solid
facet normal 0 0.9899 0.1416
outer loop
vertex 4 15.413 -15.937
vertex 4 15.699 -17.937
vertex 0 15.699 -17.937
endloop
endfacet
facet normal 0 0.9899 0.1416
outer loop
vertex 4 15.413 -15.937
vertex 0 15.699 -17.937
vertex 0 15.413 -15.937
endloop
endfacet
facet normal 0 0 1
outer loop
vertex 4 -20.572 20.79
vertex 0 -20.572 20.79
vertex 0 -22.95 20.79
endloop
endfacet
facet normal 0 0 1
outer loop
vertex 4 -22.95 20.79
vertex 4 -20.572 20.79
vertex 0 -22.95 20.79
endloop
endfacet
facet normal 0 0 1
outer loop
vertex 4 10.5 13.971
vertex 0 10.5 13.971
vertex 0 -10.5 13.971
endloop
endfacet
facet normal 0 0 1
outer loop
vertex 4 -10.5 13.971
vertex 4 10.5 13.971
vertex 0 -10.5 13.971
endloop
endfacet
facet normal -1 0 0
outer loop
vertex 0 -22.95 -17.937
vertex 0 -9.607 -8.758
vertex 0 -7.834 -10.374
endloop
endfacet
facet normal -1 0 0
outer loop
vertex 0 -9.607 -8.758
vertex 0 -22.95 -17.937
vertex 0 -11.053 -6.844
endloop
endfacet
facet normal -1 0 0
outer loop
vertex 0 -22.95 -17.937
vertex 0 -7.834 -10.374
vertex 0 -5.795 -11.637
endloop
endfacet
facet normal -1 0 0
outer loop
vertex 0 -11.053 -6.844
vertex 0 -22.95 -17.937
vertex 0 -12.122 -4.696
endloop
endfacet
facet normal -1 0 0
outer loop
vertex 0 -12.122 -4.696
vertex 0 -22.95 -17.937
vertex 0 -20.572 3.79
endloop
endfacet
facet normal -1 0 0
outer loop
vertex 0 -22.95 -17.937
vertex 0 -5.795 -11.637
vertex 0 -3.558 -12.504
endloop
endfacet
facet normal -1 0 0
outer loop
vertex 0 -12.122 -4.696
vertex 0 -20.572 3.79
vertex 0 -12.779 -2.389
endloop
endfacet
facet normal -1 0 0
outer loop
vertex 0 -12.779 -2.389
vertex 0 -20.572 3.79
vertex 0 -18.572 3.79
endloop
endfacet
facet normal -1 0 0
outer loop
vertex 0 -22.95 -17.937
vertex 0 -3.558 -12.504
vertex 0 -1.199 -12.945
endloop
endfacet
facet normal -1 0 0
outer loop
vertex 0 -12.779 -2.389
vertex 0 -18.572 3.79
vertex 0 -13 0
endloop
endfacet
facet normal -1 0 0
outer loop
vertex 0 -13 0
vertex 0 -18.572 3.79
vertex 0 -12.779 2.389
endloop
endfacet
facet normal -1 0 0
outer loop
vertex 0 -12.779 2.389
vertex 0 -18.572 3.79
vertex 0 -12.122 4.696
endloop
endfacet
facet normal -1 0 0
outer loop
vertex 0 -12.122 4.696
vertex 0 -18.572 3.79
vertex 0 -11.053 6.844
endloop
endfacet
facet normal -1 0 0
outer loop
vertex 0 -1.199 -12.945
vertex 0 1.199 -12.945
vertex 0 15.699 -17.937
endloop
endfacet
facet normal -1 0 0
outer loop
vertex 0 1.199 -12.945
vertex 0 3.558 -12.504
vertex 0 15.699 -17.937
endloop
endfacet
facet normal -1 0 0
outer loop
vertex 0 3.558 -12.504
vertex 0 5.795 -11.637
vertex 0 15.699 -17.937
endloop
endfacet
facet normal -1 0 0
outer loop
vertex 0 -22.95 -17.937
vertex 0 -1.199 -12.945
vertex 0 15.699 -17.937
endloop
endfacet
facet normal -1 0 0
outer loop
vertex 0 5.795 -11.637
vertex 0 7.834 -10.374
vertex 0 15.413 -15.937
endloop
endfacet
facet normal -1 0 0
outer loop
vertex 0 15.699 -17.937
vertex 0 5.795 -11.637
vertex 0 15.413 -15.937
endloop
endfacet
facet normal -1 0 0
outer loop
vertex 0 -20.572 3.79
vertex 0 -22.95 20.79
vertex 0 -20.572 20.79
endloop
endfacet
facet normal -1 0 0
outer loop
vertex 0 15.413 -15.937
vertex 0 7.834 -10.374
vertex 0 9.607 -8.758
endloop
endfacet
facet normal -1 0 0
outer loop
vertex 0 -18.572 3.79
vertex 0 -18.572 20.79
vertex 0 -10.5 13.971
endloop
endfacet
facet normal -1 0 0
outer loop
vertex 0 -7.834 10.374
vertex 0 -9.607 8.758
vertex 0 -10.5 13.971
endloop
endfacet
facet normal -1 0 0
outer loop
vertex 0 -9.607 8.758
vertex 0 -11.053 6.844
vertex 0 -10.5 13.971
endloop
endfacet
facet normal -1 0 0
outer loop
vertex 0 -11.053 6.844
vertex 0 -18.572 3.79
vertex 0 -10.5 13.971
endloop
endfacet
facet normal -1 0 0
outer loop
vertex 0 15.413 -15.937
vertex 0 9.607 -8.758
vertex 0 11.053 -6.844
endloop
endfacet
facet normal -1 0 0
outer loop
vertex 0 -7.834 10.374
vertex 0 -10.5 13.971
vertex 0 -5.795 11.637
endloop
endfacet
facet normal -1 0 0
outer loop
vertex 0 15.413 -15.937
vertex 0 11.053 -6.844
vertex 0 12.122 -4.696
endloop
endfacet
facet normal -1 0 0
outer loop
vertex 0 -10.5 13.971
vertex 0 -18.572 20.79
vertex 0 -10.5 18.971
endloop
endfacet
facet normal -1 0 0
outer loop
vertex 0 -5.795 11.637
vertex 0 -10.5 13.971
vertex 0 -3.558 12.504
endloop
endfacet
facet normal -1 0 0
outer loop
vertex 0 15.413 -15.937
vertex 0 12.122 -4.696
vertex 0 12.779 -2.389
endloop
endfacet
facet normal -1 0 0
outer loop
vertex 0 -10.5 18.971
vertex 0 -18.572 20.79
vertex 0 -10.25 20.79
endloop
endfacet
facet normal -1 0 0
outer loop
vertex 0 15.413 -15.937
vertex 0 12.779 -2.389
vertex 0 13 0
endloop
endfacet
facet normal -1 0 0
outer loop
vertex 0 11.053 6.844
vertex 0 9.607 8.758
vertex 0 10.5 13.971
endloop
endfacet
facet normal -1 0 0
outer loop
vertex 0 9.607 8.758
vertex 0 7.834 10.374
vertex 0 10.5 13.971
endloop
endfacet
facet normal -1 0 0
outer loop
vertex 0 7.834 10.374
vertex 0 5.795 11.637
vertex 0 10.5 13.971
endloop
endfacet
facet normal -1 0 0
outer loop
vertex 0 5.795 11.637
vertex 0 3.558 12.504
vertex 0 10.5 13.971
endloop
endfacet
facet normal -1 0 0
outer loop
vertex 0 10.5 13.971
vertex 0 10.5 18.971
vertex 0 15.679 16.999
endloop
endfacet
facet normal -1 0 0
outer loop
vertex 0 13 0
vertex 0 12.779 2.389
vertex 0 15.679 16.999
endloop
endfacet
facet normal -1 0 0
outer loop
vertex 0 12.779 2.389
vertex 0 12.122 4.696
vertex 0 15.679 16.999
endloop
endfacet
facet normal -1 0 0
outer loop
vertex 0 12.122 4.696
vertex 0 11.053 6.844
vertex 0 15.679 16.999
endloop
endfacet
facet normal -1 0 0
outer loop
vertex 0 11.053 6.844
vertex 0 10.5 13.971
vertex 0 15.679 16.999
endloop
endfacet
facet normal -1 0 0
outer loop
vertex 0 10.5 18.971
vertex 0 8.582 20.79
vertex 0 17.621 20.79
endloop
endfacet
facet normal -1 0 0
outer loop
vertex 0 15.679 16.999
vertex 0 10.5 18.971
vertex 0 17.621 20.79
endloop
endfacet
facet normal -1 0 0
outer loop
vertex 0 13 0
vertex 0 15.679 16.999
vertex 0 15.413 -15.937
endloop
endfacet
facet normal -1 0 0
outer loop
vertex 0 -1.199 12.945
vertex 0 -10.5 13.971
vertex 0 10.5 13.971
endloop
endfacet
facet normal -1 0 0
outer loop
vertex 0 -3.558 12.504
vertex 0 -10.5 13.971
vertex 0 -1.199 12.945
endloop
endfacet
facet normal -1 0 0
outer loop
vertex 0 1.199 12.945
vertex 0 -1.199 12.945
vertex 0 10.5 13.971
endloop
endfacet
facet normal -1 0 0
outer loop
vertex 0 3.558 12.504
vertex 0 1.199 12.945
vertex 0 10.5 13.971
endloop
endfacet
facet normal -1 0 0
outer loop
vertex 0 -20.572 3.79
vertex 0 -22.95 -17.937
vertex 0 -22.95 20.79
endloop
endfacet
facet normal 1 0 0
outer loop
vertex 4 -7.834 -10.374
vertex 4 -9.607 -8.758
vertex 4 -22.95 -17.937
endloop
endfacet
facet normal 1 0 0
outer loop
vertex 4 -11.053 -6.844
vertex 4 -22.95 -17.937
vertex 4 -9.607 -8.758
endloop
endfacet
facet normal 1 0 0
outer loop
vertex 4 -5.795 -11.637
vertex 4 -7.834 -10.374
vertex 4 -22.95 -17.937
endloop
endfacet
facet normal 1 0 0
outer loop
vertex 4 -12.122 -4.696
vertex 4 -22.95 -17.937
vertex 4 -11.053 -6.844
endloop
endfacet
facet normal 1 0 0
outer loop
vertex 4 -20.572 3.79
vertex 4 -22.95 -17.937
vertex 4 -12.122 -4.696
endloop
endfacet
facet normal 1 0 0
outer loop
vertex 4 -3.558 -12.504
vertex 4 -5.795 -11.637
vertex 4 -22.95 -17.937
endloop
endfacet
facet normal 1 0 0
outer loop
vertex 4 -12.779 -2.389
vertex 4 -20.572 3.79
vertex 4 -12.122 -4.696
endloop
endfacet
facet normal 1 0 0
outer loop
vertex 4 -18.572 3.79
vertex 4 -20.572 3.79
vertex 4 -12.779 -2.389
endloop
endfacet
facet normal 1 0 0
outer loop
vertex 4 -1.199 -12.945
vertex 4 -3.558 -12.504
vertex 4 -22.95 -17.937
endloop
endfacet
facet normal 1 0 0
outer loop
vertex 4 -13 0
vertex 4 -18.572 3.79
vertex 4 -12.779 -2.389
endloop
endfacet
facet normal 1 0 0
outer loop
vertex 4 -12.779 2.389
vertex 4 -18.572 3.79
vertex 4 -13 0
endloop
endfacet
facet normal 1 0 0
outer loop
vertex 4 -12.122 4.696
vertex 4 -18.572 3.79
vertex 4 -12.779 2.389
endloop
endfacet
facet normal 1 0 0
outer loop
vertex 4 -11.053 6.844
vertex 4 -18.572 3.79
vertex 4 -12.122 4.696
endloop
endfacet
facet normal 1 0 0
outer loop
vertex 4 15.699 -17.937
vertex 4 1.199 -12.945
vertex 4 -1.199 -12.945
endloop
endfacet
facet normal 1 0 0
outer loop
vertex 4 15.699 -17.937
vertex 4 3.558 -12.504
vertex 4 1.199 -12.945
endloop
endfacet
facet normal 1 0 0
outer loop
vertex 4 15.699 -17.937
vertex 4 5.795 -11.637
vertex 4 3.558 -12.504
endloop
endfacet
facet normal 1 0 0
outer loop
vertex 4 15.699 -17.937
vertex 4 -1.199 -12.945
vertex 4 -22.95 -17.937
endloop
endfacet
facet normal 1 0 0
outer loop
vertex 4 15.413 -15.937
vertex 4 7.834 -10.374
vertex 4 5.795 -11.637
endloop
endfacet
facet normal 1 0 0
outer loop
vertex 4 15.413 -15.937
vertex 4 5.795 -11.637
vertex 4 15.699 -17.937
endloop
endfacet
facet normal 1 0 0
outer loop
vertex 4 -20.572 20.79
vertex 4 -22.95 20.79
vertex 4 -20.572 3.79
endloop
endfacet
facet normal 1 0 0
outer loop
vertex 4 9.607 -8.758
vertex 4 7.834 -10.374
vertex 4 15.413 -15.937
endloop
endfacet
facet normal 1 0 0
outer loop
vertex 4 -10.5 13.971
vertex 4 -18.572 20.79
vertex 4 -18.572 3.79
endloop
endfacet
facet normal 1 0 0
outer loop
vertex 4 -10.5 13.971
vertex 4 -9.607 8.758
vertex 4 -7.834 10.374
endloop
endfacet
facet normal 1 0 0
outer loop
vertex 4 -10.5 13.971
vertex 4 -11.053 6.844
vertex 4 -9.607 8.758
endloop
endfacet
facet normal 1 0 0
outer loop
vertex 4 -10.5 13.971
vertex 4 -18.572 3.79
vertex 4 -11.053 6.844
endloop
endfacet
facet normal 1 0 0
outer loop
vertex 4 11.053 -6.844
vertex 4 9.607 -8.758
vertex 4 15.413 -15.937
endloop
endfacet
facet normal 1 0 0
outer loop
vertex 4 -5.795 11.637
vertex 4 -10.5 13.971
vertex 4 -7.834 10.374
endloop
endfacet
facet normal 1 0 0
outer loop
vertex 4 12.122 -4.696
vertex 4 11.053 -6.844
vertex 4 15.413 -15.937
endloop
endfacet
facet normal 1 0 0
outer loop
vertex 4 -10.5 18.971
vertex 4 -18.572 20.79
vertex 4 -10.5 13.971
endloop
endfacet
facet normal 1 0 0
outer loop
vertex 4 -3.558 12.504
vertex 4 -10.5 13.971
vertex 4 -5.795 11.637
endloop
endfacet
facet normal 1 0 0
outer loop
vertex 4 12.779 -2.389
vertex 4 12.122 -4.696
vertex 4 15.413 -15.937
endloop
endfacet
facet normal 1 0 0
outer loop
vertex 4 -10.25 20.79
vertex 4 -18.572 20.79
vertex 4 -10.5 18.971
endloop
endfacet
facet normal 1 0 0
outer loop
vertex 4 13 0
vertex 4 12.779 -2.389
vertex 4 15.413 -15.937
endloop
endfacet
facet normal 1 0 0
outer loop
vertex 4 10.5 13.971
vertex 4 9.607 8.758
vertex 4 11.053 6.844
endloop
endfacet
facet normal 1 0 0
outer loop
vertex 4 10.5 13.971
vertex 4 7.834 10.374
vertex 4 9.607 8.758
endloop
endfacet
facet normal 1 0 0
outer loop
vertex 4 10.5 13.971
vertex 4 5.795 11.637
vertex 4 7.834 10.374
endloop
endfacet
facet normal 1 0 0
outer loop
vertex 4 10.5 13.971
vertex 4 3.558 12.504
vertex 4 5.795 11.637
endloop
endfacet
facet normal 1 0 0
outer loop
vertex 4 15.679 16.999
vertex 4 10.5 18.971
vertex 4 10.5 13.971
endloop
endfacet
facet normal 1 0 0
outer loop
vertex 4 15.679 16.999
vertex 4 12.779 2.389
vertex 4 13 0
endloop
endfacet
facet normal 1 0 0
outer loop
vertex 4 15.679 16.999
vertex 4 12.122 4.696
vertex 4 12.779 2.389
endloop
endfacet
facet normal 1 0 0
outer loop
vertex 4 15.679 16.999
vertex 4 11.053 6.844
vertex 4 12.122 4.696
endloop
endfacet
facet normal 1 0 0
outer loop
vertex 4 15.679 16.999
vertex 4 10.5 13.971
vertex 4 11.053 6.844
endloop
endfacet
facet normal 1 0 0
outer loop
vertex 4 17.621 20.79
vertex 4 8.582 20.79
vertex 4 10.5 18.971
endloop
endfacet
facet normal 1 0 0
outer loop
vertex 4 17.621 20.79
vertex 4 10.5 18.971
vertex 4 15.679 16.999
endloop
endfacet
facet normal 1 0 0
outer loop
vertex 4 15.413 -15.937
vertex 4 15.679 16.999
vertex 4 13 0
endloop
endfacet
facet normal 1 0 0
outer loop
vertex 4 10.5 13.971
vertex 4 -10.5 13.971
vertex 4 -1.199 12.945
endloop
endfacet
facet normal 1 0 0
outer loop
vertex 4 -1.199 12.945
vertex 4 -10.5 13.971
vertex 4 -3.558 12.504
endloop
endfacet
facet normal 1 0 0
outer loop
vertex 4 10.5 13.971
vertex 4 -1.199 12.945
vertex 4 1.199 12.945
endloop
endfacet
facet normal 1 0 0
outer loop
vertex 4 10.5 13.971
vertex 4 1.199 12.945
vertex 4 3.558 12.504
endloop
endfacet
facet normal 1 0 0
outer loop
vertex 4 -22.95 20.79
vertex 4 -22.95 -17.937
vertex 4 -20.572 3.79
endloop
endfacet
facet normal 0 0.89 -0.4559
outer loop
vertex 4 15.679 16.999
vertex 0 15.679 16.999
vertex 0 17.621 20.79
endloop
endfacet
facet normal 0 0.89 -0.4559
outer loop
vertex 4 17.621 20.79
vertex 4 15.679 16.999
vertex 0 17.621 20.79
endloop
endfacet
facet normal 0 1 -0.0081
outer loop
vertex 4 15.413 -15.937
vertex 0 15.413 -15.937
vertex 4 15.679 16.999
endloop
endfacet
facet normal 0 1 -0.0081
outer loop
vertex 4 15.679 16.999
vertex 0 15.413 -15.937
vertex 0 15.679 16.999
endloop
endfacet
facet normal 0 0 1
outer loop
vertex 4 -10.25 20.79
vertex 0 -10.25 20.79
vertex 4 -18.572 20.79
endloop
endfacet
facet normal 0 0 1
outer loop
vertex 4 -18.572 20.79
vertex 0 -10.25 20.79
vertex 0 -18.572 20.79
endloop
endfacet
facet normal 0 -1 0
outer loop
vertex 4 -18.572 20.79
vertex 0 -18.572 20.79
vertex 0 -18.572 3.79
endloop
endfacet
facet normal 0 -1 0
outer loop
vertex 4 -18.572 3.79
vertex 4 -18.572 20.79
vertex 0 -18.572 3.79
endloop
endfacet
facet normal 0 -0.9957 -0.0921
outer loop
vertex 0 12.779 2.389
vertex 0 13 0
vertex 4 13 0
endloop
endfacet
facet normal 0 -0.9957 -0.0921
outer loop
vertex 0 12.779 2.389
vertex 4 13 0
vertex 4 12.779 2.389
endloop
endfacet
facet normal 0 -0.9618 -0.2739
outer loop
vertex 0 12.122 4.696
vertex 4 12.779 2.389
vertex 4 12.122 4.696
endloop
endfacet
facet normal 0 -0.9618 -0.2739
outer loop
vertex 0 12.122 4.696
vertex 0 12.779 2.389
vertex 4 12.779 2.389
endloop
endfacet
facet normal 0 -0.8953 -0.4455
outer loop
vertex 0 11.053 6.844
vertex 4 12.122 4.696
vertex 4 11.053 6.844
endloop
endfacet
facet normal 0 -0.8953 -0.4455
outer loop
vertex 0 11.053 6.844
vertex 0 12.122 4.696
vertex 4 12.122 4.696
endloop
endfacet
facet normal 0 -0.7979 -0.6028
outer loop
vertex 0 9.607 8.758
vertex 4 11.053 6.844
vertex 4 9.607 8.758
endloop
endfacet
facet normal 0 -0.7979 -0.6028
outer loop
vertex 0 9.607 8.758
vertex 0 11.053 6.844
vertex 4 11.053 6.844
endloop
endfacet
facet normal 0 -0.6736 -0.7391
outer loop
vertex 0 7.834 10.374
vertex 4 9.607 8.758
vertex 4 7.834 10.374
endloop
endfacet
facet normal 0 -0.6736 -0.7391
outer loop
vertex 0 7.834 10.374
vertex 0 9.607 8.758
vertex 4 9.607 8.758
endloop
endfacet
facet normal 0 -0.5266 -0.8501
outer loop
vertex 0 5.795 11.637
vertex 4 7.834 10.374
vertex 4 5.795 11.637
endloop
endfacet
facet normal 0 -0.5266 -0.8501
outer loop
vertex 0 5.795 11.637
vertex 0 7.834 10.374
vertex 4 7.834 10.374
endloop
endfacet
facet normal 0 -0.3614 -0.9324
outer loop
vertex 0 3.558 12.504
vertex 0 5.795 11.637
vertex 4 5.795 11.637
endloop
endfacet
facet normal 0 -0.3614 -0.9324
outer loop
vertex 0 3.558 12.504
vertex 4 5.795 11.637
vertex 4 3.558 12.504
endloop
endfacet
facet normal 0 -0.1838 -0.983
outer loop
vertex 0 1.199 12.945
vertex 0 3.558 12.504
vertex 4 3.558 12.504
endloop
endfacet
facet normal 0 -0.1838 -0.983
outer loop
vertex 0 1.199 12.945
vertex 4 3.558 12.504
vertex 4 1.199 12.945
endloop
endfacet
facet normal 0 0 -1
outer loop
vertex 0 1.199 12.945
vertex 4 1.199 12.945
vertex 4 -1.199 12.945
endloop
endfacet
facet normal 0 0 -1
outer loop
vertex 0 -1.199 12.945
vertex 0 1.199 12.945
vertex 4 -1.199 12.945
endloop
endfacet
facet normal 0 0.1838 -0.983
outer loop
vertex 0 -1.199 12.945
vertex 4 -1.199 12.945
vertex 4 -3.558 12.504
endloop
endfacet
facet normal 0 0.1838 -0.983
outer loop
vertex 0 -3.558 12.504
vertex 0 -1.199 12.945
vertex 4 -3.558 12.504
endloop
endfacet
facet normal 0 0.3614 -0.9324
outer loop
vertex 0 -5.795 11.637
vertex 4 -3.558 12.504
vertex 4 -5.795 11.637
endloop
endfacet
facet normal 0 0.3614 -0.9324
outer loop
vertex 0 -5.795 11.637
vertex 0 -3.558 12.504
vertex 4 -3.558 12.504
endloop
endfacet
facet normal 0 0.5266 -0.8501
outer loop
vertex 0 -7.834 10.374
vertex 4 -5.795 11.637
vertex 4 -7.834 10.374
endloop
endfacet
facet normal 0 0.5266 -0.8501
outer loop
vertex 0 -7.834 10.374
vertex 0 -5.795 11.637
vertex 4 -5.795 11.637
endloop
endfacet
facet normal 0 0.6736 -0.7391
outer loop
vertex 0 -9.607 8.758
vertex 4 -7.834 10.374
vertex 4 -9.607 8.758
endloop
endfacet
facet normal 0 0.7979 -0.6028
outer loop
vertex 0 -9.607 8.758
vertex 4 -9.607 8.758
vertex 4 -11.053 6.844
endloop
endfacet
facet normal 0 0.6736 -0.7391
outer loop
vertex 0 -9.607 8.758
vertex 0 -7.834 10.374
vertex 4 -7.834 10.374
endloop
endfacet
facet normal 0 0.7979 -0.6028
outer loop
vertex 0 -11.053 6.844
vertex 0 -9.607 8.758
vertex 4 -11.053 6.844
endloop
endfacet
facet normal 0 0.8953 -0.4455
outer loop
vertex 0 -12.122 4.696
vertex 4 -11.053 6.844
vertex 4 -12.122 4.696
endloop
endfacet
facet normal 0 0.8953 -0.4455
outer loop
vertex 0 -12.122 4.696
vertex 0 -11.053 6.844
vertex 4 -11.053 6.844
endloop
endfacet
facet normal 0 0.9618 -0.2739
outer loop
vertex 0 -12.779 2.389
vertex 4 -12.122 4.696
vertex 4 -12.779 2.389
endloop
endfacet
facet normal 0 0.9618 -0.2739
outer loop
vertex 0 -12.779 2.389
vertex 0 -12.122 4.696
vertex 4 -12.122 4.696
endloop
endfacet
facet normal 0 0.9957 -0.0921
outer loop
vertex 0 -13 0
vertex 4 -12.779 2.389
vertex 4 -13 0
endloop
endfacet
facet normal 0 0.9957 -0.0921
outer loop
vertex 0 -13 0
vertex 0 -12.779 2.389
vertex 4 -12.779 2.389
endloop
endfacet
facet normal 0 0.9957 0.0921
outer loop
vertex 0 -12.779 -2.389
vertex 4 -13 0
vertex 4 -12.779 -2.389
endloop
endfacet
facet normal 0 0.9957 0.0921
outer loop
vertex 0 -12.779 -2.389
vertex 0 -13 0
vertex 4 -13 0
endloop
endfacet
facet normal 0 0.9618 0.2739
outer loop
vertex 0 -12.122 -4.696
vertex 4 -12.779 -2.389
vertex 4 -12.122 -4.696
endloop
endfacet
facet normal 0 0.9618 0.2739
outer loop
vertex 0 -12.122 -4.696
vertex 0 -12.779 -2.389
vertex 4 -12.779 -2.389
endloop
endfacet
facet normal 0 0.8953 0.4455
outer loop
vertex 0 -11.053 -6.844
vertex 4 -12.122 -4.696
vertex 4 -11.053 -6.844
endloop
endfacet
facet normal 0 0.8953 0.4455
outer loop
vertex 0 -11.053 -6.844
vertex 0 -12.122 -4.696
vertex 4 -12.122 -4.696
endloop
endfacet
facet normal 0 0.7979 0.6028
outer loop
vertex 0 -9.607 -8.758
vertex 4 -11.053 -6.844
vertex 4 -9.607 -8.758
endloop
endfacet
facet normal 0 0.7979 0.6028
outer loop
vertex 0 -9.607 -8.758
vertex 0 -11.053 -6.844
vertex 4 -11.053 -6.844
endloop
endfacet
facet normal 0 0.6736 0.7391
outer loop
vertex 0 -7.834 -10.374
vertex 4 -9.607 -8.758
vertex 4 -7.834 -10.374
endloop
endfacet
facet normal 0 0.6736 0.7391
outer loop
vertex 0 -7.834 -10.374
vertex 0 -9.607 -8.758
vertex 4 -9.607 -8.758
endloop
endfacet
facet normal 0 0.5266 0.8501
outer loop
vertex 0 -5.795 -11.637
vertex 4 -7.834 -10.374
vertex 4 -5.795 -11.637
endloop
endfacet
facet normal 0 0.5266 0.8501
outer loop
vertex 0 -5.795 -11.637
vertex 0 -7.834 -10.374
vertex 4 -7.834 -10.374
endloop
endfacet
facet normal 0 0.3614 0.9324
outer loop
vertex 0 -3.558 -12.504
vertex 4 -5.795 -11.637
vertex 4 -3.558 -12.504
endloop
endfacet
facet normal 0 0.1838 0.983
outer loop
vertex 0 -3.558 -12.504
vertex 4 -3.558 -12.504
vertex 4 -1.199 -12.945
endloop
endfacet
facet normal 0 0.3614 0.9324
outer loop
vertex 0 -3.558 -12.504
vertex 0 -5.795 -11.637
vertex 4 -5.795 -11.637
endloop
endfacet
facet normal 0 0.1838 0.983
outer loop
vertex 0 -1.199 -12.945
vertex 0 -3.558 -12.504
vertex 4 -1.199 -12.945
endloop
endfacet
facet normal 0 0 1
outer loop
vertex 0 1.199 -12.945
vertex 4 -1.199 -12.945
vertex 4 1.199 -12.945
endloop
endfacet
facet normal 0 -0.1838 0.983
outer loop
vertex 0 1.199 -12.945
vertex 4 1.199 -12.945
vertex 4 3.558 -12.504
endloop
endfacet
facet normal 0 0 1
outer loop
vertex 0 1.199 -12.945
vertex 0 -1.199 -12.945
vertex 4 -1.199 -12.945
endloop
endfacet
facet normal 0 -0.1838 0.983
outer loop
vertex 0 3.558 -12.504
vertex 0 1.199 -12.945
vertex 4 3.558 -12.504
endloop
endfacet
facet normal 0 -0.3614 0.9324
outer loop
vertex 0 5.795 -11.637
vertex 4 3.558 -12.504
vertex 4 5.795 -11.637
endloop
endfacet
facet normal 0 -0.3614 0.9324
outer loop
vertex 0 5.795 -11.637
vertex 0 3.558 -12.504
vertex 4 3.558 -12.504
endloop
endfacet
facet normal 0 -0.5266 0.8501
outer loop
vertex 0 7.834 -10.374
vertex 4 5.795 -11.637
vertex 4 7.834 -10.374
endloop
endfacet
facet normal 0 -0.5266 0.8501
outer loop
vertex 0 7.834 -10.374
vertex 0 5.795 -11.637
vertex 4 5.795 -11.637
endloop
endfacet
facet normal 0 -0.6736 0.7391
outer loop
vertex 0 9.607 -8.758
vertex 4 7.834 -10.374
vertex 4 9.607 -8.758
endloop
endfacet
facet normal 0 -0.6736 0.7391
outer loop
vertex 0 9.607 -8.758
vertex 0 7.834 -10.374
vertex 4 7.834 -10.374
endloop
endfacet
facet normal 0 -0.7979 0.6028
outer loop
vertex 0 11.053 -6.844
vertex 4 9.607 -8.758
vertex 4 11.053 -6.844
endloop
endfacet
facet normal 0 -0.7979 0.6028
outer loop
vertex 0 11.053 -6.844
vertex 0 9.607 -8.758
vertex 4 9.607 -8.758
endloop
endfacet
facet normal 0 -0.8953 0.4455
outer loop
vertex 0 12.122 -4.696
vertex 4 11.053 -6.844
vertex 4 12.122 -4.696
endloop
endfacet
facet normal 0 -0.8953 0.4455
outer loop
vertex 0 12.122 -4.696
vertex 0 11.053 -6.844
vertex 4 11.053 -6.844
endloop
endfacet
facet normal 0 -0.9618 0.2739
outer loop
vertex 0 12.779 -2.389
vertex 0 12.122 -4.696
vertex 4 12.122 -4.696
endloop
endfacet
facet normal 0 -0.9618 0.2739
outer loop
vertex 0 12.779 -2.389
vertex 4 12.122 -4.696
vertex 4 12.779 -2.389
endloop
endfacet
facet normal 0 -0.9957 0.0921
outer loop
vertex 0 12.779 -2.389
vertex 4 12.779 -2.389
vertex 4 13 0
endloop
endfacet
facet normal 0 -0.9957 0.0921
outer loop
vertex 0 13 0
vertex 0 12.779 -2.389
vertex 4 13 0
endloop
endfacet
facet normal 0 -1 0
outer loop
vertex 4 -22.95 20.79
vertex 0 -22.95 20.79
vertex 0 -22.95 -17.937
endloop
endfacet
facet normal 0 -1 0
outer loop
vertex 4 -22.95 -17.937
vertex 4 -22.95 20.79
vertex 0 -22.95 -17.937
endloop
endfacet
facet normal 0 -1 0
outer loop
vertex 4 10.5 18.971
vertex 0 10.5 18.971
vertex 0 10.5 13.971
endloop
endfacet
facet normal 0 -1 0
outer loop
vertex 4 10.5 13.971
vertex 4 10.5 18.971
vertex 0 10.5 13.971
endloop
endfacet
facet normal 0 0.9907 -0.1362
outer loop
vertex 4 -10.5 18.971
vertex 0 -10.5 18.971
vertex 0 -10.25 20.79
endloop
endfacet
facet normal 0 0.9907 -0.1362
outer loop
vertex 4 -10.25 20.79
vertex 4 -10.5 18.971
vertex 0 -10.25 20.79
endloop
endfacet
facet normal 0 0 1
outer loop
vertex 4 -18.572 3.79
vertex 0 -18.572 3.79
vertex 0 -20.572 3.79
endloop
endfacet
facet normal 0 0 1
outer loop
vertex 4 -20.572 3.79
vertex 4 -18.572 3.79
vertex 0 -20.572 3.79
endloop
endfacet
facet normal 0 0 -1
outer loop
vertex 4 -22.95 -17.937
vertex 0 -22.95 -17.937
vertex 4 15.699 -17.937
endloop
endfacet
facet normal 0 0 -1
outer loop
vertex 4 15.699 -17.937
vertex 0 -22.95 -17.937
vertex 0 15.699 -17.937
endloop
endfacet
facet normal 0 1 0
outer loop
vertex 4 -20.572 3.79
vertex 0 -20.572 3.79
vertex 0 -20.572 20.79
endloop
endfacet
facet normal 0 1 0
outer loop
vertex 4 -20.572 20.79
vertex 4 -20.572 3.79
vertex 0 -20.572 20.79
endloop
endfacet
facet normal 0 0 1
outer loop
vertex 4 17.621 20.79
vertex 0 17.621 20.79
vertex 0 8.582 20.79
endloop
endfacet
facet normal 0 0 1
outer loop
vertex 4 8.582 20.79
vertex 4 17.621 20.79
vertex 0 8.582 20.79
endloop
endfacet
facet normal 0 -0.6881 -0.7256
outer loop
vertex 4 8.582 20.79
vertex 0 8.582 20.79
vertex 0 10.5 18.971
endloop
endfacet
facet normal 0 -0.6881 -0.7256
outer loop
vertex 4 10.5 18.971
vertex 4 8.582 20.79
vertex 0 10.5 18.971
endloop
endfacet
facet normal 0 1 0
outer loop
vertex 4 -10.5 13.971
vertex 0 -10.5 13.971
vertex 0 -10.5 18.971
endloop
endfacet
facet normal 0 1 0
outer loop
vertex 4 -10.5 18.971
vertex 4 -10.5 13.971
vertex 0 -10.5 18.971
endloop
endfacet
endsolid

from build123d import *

# Parameters (mm, degrees)
F0_R     = 13
F1_DEPTH = 4


with BuildPart() as f1:
    # F0 (on Right) → F1 (new body)
    with BuildSketch(Plane.YZ):
        Polygon((15.412828, -15.937231), (-22.950384, -15.937231), (-22.950384, -17.937231), (15.699004, -17.937231), align=None)
        Polygon((-22.950384, 20.790322), (-22.950384, -15.937231), (15.412828, -15.937231), (15.679364, 16.999187), (17.621164, 20.790322), (10.5, 20.790322), (8.581838, 20.790322), (10.5, 18.970987), (10.5, 13.970987), (-10.5, 13.970987), (-10.5, 18.970987), (-10.25, 20.790322), (-18.572044, 20.790322), (-18.572044, 3.790322), (-20.572044, 3.790322), (-20.572044, 20.790322), align=None)
        Circle(F0_R, mode=Mode.SUBTRACT)
    extrude(amount=F1_DEPTH)


solid = f1.part
